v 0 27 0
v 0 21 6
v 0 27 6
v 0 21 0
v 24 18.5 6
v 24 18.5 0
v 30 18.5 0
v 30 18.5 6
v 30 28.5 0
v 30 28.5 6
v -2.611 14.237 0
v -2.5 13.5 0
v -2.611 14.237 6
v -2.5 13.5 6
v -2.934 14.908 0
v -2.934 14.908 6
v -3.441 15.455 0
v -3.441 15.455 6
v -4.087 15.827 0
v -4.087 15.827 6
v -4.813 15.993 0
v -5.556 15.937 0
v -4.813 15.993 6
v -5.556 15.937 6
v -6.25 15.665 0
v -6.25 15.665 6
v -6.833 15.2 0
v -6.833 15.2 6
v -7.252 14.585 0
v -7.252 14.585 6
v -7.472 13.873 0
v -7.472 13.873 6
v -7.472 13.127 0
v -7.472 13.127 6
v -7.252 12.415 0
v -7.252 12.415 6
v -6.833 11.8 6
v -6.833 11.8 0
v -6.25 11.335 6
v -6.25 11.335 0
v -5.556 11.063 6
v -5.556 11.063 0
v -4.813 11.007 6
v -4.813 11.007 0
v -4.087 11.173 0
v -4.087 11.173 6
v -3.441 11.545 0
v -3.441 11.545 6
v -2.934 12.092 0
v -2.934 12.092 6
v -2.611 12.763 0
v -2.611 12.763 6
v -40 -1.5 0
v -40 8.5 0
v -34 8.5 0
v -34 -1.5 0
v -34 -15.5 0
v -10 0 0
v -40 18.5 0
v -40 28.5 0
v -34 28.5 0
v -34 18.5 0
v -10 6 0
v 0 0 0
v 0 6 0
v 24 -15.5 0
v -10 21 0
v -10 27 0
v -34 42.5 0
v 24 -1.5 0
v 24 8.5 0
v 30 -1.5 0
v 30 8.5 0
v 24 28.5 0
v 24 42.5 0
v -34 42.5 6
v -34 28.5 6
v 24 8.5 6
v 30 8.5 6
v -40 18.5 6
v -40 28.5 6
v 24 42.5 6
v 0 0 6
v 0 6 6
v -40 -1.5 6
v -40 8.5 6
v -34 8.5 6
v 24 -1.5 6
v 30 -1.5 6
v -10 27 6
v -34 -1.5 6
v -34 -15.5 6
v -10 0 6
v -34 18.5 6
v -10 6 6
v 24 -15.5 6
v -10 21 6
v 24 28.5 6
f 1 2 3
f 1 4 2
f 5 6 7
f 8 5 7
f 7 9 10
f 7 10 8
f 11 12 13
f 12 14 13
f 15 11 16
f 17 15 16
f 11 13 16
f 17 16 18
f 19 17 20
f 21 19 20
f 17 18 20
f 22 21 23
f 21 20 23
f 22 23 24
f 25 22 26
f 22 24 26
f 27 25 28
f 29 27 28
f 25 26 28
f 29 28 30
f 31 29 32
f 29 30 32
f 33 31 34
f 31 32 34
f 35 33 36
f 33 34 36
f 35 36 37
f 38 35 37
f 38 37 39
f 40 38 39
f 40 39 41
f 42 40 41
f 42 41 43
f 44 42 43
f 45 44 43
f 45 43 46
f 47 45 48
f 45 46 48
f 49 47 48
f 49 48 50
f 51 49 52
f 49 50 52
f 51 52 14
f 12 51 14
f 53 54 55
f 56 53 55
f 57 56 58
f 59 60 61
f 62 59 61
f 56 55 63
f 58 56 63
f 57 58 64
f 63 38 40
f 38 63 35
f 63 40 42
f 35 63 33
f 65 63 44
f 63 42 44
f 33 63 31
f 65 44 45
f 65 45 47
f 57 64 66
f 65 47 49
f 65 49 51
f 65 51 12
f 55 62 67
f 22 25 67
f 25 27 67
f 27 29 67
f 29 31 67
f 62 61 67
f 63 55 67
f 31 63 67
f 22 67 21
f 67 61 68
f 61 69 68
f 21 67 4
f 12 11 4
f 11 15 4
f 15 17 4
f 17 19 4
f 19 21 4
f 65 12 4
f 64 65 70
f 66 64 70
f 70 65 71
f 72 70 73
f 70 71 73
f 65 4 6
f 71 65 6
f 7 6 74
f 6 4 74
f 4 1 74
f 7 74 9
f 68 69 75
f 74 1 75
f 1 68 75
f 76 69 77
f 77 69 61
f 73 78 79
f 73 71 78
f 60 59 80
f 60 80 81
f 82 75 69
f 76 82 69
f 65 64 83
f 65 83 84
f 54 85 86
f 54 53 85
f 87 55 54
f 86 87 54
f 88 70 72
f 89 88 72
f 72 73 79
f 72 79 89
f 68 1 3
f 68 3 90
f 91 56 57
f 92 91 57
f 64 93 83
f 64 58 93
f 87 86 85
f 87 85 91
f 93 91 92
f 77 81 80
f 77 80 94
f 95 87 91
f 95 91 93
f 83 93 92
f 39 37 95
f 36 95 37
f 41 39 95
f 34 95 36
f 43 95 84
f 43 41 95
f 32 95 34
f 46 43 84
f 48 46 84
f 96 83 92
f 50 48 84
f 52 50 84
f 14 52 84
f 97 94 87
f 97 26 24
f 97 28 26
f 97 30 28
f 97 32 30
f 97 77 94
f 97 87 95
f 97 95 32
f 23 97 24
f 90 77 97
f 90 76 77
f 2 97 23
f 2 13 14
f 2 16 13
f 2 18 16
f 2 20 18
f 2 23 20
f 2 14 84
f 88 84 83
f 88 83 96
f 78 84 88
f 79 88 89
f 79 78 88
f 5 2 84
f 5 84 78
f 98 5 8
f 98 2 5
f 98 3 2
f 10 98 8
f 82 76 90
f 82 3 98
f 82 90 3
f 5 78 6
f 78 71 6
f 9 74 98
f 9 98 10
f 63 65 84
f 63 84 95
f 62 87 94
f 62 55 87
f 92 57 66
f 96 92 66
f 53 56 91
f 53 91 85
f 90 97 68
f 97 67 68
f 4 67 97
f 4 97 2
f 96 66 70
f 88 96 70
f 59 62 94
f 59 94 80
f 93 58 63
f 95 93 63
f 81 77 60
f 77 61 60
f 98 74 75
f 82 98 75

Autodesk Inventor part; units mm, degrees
ref_plane "YZ Plane" through (0, 0, 0) normal (1, 0, 0) x (0, 1, 0)
ref_plane "XZ Plane" through (0, 0, 0) normal (0, 1, 0) x (-1, 0, 0)
ref_plane "XY Plane" through (0, 0, 0) normal (0, 0, 1) x (1, 0, 0)
ref_plane "Work Plane1" through (0, 0, 0) normal (0, 0, 1) x (1, 0, 0)
sketch "Sketch1" plane through (0, 0, 0) normal (0, 0, 1) x (1, 0, 0)
  line L0 (-10, 0) -> (-10, 6)
  line L1 (-10, 6) -> (-34, 6)
  line L2 (-34, 0) -> (-34, 6)
  line L3 (-34, 0) -> (-10, 0)
  line L4 (-10, 21) -> (-10, 27)
  line L5 (-10, 27) -> (-34, 27)
  line L6 (-34, 21) -> (-34, 27)
  line L7 (-34, 21) -> (-10, 21)
  line L8 (0, 21) -> (0, 27)
  line L9 (0, 21) -> (24, 21)
  line L10 (24, 21) -> (24, 27)
  line L11 (24, 27) -> (0, 27)
  line L12 (0, 0) -> (0, 6)
  line L13 (0, 0) -> (24, 0)
  line L14 (24, 0) -> (24, 6)
  line L15 (24, 6) -> (0, 6)
  line L16 (24, 8.5) -> (30, 8.5)
  line L17 (30, 8.5) -> (30, -1.5)
  line L18 (24, -1.5) -> (30, -1.5)
  line L19 (24, -1.5) -> (24, 8.5)
  line L20 (24, 18.5) -> (30, 18.5)
  line L21 (24, 18.5) -> (24, 28.5)
  line L22 (24, 28.5) -> (30, 28.5)
  line L23 (30, 28.5) -> (30, 18.5)
  line L24 (10, -15.5) -> (20, -15.5)
  line L25 (24, -11.5) -> (24, -1.5)
  line L26 (24, 28.5) -> (24, 38.5)
  line L27 (20, 42.5) -> (10, 42.5)
  line L28 (-20, 42.5) -> (-30, 42.5)
  line L29 (-34, 38.5) -> (-34, 28.5)
  line L30 (-34, 8.5) -> (-34, 18.5)
  line L31 (-34, -11.5) -> (-34, -1.5)
  line L32 (-30, -15.5) -> (-20, -15.5)
  line L33 (-10, -15.5) -> (0, -15.5)
  line L34 (10, -15.5) -> (20, -15.5)
  line L35 (-34, -15.5) -> (24, -15.5)
  line L36 (24, -15.5) -> (24, 42.5)
  line L37 (24, 42.5) -> (-34, 42.5)
  line L38 (-34, 42.5) -> (-34, -15.5)
  line L39 (-34, 8.5) -> (-40, 8.5)
  line L40 (-34, 8.5) -> (-34, -1.5)
  line L41 (-34, -1.5) -> (-40, -1.5)
  line L42 (-40, -1.5) -> (-40, 8.5)
  line L43 (-34, 18.5) -> (-40, 18.5)
  line L44 (-40, 18.5) -> (-40, 28.5)
  line L45 (-34, 28.5) -> (-40, 28.5)
  line L46 (-34, 28.5) -> (-34, 18.5)
  line L47 (0, 27) -> (-10, 27)
  line L48 (-10, 21) -> (-10, 27)
  line L49 (-10, 21) -> (0, 21)
  line L50 (0, 21) -> (0, 27)
  line L51 (0, 6) -> (-10, 6)
  line L52 (-10, 0) -> (-10, 6)
  line L53 (-10, 0) -> (0, 0)
  line L54 (0, 0) -> (0, 6)
extrude "Plate1" add sketch "Sketch1" along normal blind 6 contours L3 L2 L1 L0 | L53 L13 L19 L25 L36 L35 L24 L33 L32 L38 L31 L3 | L1 L38 L30 L7 L49 L9 L21 L36 L19 L15 L51 | L38 L41 L42 L39 L2 | L12 L15 L14 L13 | L14 L19 L16 L17 L18 | L43 L44 L45 L38 L6 | L6 L5 L4 L7 | L21 L10 L22 L23 L20 | L38 L29 L37 L28 L27 L36 L26 L21 L11 L47 L5 | L9 L8 L11 L10
sketch "Sketch2" plane through (0, 0, 6) normal (0, 0, 1) x (1, 0, 0)
  line L0 (-10, 27) -> (0, 27) projected
  line L1 (0, 27) -> (0, 21) projected
  line L2 (0, 21) -> (-10, 21) projected
  line L3 (-10, 21) -> (-10, 27) projected
  line L4 (0, 0) -> (-10, 0) projected
  line L5 (-10, 0) -> (-10, 6) projected
  line L6 (-10, 6) -> (0, 6) projected
  line L7 (0, 6) -> (0, 0) projected
  line L8 (30, -1.5) -> (24, -1.5) projected
  line L9 (30, 8.5) -> (30, -1.5) projected
  line L10 (24, 8.5) -> (30, 8.5) projected
  line L11 (24, 18.5) -> (24, 8.5) projected
  line L12 (30, 18.5) -> (24, 18.5) projected
  line L13 (30, 28.5) -> (30, 18.5) projected
  line L14 (24, 28.5) -> (30, 28.5) projected
  line L15 (24, 42.5) -> (24, 28.5) projected
  line L16 (-34, 42.5) -> (24, 42.5) projected
  line L17 (-34, 28.5) -> (-34, 42.5) projected
  line L18 (-40, 28.5) -> (-34, 28.5) projected
  line L19 (-40, 18.5) -> (-40, 28.5) projected
  line L20 (-34, 18.5) -> (-40, 18.5) projected
  line L21 (-34, 8.5) -> (-34, 18.5) projected
  line L22 (-40, 8.5) -> (-34, 8.5) projected
  line L23 (-40, -1.5) -> (-40, 8.5) projected
  line L24 (-34, -1.5) -> (-40, -1.5) projected
  line L25 (-34, -15.5) -> (-34, -1.5) projected
  line L26 (24, -15.5) -> (-34, -15.5) projected
  line L27 (24, -1.5) -> (24, -15.5) projected
  circle A0 centre (-5, 13.5) radius 2.5
  point P0 (0, 0)
  point P1 (-5, 6)
  point P2 (-34, 13.5)
  dimension "d1" = 5
extrude "Cut1" cut sketch "Sketch2" against normal blind 6 contours A0
equation "\"d2\" = Thickness"
equation "\"d0\" = Thickness"
equation "\"BendRadius\" = Thickness"
equation "\"BendReliefWidth\" = Thickness"
equation "\"BendReliefDepth\" = 0.5 * Thickness"
equation "\"CornerReliefSize\" = 4 * Thickness"
equation "\"MinimumRemnant\" = 2 * Thickness"
equation "\"TransitionRadius\" = BendRadius"
equation "\"JacobiRadiusSize\" = BendRadius"
equation "\"GapSize\" = Thickness"
equation "\"Thickness\" = 6"
properties part number "joystick binnenkant" material "Wood (Birch)"
